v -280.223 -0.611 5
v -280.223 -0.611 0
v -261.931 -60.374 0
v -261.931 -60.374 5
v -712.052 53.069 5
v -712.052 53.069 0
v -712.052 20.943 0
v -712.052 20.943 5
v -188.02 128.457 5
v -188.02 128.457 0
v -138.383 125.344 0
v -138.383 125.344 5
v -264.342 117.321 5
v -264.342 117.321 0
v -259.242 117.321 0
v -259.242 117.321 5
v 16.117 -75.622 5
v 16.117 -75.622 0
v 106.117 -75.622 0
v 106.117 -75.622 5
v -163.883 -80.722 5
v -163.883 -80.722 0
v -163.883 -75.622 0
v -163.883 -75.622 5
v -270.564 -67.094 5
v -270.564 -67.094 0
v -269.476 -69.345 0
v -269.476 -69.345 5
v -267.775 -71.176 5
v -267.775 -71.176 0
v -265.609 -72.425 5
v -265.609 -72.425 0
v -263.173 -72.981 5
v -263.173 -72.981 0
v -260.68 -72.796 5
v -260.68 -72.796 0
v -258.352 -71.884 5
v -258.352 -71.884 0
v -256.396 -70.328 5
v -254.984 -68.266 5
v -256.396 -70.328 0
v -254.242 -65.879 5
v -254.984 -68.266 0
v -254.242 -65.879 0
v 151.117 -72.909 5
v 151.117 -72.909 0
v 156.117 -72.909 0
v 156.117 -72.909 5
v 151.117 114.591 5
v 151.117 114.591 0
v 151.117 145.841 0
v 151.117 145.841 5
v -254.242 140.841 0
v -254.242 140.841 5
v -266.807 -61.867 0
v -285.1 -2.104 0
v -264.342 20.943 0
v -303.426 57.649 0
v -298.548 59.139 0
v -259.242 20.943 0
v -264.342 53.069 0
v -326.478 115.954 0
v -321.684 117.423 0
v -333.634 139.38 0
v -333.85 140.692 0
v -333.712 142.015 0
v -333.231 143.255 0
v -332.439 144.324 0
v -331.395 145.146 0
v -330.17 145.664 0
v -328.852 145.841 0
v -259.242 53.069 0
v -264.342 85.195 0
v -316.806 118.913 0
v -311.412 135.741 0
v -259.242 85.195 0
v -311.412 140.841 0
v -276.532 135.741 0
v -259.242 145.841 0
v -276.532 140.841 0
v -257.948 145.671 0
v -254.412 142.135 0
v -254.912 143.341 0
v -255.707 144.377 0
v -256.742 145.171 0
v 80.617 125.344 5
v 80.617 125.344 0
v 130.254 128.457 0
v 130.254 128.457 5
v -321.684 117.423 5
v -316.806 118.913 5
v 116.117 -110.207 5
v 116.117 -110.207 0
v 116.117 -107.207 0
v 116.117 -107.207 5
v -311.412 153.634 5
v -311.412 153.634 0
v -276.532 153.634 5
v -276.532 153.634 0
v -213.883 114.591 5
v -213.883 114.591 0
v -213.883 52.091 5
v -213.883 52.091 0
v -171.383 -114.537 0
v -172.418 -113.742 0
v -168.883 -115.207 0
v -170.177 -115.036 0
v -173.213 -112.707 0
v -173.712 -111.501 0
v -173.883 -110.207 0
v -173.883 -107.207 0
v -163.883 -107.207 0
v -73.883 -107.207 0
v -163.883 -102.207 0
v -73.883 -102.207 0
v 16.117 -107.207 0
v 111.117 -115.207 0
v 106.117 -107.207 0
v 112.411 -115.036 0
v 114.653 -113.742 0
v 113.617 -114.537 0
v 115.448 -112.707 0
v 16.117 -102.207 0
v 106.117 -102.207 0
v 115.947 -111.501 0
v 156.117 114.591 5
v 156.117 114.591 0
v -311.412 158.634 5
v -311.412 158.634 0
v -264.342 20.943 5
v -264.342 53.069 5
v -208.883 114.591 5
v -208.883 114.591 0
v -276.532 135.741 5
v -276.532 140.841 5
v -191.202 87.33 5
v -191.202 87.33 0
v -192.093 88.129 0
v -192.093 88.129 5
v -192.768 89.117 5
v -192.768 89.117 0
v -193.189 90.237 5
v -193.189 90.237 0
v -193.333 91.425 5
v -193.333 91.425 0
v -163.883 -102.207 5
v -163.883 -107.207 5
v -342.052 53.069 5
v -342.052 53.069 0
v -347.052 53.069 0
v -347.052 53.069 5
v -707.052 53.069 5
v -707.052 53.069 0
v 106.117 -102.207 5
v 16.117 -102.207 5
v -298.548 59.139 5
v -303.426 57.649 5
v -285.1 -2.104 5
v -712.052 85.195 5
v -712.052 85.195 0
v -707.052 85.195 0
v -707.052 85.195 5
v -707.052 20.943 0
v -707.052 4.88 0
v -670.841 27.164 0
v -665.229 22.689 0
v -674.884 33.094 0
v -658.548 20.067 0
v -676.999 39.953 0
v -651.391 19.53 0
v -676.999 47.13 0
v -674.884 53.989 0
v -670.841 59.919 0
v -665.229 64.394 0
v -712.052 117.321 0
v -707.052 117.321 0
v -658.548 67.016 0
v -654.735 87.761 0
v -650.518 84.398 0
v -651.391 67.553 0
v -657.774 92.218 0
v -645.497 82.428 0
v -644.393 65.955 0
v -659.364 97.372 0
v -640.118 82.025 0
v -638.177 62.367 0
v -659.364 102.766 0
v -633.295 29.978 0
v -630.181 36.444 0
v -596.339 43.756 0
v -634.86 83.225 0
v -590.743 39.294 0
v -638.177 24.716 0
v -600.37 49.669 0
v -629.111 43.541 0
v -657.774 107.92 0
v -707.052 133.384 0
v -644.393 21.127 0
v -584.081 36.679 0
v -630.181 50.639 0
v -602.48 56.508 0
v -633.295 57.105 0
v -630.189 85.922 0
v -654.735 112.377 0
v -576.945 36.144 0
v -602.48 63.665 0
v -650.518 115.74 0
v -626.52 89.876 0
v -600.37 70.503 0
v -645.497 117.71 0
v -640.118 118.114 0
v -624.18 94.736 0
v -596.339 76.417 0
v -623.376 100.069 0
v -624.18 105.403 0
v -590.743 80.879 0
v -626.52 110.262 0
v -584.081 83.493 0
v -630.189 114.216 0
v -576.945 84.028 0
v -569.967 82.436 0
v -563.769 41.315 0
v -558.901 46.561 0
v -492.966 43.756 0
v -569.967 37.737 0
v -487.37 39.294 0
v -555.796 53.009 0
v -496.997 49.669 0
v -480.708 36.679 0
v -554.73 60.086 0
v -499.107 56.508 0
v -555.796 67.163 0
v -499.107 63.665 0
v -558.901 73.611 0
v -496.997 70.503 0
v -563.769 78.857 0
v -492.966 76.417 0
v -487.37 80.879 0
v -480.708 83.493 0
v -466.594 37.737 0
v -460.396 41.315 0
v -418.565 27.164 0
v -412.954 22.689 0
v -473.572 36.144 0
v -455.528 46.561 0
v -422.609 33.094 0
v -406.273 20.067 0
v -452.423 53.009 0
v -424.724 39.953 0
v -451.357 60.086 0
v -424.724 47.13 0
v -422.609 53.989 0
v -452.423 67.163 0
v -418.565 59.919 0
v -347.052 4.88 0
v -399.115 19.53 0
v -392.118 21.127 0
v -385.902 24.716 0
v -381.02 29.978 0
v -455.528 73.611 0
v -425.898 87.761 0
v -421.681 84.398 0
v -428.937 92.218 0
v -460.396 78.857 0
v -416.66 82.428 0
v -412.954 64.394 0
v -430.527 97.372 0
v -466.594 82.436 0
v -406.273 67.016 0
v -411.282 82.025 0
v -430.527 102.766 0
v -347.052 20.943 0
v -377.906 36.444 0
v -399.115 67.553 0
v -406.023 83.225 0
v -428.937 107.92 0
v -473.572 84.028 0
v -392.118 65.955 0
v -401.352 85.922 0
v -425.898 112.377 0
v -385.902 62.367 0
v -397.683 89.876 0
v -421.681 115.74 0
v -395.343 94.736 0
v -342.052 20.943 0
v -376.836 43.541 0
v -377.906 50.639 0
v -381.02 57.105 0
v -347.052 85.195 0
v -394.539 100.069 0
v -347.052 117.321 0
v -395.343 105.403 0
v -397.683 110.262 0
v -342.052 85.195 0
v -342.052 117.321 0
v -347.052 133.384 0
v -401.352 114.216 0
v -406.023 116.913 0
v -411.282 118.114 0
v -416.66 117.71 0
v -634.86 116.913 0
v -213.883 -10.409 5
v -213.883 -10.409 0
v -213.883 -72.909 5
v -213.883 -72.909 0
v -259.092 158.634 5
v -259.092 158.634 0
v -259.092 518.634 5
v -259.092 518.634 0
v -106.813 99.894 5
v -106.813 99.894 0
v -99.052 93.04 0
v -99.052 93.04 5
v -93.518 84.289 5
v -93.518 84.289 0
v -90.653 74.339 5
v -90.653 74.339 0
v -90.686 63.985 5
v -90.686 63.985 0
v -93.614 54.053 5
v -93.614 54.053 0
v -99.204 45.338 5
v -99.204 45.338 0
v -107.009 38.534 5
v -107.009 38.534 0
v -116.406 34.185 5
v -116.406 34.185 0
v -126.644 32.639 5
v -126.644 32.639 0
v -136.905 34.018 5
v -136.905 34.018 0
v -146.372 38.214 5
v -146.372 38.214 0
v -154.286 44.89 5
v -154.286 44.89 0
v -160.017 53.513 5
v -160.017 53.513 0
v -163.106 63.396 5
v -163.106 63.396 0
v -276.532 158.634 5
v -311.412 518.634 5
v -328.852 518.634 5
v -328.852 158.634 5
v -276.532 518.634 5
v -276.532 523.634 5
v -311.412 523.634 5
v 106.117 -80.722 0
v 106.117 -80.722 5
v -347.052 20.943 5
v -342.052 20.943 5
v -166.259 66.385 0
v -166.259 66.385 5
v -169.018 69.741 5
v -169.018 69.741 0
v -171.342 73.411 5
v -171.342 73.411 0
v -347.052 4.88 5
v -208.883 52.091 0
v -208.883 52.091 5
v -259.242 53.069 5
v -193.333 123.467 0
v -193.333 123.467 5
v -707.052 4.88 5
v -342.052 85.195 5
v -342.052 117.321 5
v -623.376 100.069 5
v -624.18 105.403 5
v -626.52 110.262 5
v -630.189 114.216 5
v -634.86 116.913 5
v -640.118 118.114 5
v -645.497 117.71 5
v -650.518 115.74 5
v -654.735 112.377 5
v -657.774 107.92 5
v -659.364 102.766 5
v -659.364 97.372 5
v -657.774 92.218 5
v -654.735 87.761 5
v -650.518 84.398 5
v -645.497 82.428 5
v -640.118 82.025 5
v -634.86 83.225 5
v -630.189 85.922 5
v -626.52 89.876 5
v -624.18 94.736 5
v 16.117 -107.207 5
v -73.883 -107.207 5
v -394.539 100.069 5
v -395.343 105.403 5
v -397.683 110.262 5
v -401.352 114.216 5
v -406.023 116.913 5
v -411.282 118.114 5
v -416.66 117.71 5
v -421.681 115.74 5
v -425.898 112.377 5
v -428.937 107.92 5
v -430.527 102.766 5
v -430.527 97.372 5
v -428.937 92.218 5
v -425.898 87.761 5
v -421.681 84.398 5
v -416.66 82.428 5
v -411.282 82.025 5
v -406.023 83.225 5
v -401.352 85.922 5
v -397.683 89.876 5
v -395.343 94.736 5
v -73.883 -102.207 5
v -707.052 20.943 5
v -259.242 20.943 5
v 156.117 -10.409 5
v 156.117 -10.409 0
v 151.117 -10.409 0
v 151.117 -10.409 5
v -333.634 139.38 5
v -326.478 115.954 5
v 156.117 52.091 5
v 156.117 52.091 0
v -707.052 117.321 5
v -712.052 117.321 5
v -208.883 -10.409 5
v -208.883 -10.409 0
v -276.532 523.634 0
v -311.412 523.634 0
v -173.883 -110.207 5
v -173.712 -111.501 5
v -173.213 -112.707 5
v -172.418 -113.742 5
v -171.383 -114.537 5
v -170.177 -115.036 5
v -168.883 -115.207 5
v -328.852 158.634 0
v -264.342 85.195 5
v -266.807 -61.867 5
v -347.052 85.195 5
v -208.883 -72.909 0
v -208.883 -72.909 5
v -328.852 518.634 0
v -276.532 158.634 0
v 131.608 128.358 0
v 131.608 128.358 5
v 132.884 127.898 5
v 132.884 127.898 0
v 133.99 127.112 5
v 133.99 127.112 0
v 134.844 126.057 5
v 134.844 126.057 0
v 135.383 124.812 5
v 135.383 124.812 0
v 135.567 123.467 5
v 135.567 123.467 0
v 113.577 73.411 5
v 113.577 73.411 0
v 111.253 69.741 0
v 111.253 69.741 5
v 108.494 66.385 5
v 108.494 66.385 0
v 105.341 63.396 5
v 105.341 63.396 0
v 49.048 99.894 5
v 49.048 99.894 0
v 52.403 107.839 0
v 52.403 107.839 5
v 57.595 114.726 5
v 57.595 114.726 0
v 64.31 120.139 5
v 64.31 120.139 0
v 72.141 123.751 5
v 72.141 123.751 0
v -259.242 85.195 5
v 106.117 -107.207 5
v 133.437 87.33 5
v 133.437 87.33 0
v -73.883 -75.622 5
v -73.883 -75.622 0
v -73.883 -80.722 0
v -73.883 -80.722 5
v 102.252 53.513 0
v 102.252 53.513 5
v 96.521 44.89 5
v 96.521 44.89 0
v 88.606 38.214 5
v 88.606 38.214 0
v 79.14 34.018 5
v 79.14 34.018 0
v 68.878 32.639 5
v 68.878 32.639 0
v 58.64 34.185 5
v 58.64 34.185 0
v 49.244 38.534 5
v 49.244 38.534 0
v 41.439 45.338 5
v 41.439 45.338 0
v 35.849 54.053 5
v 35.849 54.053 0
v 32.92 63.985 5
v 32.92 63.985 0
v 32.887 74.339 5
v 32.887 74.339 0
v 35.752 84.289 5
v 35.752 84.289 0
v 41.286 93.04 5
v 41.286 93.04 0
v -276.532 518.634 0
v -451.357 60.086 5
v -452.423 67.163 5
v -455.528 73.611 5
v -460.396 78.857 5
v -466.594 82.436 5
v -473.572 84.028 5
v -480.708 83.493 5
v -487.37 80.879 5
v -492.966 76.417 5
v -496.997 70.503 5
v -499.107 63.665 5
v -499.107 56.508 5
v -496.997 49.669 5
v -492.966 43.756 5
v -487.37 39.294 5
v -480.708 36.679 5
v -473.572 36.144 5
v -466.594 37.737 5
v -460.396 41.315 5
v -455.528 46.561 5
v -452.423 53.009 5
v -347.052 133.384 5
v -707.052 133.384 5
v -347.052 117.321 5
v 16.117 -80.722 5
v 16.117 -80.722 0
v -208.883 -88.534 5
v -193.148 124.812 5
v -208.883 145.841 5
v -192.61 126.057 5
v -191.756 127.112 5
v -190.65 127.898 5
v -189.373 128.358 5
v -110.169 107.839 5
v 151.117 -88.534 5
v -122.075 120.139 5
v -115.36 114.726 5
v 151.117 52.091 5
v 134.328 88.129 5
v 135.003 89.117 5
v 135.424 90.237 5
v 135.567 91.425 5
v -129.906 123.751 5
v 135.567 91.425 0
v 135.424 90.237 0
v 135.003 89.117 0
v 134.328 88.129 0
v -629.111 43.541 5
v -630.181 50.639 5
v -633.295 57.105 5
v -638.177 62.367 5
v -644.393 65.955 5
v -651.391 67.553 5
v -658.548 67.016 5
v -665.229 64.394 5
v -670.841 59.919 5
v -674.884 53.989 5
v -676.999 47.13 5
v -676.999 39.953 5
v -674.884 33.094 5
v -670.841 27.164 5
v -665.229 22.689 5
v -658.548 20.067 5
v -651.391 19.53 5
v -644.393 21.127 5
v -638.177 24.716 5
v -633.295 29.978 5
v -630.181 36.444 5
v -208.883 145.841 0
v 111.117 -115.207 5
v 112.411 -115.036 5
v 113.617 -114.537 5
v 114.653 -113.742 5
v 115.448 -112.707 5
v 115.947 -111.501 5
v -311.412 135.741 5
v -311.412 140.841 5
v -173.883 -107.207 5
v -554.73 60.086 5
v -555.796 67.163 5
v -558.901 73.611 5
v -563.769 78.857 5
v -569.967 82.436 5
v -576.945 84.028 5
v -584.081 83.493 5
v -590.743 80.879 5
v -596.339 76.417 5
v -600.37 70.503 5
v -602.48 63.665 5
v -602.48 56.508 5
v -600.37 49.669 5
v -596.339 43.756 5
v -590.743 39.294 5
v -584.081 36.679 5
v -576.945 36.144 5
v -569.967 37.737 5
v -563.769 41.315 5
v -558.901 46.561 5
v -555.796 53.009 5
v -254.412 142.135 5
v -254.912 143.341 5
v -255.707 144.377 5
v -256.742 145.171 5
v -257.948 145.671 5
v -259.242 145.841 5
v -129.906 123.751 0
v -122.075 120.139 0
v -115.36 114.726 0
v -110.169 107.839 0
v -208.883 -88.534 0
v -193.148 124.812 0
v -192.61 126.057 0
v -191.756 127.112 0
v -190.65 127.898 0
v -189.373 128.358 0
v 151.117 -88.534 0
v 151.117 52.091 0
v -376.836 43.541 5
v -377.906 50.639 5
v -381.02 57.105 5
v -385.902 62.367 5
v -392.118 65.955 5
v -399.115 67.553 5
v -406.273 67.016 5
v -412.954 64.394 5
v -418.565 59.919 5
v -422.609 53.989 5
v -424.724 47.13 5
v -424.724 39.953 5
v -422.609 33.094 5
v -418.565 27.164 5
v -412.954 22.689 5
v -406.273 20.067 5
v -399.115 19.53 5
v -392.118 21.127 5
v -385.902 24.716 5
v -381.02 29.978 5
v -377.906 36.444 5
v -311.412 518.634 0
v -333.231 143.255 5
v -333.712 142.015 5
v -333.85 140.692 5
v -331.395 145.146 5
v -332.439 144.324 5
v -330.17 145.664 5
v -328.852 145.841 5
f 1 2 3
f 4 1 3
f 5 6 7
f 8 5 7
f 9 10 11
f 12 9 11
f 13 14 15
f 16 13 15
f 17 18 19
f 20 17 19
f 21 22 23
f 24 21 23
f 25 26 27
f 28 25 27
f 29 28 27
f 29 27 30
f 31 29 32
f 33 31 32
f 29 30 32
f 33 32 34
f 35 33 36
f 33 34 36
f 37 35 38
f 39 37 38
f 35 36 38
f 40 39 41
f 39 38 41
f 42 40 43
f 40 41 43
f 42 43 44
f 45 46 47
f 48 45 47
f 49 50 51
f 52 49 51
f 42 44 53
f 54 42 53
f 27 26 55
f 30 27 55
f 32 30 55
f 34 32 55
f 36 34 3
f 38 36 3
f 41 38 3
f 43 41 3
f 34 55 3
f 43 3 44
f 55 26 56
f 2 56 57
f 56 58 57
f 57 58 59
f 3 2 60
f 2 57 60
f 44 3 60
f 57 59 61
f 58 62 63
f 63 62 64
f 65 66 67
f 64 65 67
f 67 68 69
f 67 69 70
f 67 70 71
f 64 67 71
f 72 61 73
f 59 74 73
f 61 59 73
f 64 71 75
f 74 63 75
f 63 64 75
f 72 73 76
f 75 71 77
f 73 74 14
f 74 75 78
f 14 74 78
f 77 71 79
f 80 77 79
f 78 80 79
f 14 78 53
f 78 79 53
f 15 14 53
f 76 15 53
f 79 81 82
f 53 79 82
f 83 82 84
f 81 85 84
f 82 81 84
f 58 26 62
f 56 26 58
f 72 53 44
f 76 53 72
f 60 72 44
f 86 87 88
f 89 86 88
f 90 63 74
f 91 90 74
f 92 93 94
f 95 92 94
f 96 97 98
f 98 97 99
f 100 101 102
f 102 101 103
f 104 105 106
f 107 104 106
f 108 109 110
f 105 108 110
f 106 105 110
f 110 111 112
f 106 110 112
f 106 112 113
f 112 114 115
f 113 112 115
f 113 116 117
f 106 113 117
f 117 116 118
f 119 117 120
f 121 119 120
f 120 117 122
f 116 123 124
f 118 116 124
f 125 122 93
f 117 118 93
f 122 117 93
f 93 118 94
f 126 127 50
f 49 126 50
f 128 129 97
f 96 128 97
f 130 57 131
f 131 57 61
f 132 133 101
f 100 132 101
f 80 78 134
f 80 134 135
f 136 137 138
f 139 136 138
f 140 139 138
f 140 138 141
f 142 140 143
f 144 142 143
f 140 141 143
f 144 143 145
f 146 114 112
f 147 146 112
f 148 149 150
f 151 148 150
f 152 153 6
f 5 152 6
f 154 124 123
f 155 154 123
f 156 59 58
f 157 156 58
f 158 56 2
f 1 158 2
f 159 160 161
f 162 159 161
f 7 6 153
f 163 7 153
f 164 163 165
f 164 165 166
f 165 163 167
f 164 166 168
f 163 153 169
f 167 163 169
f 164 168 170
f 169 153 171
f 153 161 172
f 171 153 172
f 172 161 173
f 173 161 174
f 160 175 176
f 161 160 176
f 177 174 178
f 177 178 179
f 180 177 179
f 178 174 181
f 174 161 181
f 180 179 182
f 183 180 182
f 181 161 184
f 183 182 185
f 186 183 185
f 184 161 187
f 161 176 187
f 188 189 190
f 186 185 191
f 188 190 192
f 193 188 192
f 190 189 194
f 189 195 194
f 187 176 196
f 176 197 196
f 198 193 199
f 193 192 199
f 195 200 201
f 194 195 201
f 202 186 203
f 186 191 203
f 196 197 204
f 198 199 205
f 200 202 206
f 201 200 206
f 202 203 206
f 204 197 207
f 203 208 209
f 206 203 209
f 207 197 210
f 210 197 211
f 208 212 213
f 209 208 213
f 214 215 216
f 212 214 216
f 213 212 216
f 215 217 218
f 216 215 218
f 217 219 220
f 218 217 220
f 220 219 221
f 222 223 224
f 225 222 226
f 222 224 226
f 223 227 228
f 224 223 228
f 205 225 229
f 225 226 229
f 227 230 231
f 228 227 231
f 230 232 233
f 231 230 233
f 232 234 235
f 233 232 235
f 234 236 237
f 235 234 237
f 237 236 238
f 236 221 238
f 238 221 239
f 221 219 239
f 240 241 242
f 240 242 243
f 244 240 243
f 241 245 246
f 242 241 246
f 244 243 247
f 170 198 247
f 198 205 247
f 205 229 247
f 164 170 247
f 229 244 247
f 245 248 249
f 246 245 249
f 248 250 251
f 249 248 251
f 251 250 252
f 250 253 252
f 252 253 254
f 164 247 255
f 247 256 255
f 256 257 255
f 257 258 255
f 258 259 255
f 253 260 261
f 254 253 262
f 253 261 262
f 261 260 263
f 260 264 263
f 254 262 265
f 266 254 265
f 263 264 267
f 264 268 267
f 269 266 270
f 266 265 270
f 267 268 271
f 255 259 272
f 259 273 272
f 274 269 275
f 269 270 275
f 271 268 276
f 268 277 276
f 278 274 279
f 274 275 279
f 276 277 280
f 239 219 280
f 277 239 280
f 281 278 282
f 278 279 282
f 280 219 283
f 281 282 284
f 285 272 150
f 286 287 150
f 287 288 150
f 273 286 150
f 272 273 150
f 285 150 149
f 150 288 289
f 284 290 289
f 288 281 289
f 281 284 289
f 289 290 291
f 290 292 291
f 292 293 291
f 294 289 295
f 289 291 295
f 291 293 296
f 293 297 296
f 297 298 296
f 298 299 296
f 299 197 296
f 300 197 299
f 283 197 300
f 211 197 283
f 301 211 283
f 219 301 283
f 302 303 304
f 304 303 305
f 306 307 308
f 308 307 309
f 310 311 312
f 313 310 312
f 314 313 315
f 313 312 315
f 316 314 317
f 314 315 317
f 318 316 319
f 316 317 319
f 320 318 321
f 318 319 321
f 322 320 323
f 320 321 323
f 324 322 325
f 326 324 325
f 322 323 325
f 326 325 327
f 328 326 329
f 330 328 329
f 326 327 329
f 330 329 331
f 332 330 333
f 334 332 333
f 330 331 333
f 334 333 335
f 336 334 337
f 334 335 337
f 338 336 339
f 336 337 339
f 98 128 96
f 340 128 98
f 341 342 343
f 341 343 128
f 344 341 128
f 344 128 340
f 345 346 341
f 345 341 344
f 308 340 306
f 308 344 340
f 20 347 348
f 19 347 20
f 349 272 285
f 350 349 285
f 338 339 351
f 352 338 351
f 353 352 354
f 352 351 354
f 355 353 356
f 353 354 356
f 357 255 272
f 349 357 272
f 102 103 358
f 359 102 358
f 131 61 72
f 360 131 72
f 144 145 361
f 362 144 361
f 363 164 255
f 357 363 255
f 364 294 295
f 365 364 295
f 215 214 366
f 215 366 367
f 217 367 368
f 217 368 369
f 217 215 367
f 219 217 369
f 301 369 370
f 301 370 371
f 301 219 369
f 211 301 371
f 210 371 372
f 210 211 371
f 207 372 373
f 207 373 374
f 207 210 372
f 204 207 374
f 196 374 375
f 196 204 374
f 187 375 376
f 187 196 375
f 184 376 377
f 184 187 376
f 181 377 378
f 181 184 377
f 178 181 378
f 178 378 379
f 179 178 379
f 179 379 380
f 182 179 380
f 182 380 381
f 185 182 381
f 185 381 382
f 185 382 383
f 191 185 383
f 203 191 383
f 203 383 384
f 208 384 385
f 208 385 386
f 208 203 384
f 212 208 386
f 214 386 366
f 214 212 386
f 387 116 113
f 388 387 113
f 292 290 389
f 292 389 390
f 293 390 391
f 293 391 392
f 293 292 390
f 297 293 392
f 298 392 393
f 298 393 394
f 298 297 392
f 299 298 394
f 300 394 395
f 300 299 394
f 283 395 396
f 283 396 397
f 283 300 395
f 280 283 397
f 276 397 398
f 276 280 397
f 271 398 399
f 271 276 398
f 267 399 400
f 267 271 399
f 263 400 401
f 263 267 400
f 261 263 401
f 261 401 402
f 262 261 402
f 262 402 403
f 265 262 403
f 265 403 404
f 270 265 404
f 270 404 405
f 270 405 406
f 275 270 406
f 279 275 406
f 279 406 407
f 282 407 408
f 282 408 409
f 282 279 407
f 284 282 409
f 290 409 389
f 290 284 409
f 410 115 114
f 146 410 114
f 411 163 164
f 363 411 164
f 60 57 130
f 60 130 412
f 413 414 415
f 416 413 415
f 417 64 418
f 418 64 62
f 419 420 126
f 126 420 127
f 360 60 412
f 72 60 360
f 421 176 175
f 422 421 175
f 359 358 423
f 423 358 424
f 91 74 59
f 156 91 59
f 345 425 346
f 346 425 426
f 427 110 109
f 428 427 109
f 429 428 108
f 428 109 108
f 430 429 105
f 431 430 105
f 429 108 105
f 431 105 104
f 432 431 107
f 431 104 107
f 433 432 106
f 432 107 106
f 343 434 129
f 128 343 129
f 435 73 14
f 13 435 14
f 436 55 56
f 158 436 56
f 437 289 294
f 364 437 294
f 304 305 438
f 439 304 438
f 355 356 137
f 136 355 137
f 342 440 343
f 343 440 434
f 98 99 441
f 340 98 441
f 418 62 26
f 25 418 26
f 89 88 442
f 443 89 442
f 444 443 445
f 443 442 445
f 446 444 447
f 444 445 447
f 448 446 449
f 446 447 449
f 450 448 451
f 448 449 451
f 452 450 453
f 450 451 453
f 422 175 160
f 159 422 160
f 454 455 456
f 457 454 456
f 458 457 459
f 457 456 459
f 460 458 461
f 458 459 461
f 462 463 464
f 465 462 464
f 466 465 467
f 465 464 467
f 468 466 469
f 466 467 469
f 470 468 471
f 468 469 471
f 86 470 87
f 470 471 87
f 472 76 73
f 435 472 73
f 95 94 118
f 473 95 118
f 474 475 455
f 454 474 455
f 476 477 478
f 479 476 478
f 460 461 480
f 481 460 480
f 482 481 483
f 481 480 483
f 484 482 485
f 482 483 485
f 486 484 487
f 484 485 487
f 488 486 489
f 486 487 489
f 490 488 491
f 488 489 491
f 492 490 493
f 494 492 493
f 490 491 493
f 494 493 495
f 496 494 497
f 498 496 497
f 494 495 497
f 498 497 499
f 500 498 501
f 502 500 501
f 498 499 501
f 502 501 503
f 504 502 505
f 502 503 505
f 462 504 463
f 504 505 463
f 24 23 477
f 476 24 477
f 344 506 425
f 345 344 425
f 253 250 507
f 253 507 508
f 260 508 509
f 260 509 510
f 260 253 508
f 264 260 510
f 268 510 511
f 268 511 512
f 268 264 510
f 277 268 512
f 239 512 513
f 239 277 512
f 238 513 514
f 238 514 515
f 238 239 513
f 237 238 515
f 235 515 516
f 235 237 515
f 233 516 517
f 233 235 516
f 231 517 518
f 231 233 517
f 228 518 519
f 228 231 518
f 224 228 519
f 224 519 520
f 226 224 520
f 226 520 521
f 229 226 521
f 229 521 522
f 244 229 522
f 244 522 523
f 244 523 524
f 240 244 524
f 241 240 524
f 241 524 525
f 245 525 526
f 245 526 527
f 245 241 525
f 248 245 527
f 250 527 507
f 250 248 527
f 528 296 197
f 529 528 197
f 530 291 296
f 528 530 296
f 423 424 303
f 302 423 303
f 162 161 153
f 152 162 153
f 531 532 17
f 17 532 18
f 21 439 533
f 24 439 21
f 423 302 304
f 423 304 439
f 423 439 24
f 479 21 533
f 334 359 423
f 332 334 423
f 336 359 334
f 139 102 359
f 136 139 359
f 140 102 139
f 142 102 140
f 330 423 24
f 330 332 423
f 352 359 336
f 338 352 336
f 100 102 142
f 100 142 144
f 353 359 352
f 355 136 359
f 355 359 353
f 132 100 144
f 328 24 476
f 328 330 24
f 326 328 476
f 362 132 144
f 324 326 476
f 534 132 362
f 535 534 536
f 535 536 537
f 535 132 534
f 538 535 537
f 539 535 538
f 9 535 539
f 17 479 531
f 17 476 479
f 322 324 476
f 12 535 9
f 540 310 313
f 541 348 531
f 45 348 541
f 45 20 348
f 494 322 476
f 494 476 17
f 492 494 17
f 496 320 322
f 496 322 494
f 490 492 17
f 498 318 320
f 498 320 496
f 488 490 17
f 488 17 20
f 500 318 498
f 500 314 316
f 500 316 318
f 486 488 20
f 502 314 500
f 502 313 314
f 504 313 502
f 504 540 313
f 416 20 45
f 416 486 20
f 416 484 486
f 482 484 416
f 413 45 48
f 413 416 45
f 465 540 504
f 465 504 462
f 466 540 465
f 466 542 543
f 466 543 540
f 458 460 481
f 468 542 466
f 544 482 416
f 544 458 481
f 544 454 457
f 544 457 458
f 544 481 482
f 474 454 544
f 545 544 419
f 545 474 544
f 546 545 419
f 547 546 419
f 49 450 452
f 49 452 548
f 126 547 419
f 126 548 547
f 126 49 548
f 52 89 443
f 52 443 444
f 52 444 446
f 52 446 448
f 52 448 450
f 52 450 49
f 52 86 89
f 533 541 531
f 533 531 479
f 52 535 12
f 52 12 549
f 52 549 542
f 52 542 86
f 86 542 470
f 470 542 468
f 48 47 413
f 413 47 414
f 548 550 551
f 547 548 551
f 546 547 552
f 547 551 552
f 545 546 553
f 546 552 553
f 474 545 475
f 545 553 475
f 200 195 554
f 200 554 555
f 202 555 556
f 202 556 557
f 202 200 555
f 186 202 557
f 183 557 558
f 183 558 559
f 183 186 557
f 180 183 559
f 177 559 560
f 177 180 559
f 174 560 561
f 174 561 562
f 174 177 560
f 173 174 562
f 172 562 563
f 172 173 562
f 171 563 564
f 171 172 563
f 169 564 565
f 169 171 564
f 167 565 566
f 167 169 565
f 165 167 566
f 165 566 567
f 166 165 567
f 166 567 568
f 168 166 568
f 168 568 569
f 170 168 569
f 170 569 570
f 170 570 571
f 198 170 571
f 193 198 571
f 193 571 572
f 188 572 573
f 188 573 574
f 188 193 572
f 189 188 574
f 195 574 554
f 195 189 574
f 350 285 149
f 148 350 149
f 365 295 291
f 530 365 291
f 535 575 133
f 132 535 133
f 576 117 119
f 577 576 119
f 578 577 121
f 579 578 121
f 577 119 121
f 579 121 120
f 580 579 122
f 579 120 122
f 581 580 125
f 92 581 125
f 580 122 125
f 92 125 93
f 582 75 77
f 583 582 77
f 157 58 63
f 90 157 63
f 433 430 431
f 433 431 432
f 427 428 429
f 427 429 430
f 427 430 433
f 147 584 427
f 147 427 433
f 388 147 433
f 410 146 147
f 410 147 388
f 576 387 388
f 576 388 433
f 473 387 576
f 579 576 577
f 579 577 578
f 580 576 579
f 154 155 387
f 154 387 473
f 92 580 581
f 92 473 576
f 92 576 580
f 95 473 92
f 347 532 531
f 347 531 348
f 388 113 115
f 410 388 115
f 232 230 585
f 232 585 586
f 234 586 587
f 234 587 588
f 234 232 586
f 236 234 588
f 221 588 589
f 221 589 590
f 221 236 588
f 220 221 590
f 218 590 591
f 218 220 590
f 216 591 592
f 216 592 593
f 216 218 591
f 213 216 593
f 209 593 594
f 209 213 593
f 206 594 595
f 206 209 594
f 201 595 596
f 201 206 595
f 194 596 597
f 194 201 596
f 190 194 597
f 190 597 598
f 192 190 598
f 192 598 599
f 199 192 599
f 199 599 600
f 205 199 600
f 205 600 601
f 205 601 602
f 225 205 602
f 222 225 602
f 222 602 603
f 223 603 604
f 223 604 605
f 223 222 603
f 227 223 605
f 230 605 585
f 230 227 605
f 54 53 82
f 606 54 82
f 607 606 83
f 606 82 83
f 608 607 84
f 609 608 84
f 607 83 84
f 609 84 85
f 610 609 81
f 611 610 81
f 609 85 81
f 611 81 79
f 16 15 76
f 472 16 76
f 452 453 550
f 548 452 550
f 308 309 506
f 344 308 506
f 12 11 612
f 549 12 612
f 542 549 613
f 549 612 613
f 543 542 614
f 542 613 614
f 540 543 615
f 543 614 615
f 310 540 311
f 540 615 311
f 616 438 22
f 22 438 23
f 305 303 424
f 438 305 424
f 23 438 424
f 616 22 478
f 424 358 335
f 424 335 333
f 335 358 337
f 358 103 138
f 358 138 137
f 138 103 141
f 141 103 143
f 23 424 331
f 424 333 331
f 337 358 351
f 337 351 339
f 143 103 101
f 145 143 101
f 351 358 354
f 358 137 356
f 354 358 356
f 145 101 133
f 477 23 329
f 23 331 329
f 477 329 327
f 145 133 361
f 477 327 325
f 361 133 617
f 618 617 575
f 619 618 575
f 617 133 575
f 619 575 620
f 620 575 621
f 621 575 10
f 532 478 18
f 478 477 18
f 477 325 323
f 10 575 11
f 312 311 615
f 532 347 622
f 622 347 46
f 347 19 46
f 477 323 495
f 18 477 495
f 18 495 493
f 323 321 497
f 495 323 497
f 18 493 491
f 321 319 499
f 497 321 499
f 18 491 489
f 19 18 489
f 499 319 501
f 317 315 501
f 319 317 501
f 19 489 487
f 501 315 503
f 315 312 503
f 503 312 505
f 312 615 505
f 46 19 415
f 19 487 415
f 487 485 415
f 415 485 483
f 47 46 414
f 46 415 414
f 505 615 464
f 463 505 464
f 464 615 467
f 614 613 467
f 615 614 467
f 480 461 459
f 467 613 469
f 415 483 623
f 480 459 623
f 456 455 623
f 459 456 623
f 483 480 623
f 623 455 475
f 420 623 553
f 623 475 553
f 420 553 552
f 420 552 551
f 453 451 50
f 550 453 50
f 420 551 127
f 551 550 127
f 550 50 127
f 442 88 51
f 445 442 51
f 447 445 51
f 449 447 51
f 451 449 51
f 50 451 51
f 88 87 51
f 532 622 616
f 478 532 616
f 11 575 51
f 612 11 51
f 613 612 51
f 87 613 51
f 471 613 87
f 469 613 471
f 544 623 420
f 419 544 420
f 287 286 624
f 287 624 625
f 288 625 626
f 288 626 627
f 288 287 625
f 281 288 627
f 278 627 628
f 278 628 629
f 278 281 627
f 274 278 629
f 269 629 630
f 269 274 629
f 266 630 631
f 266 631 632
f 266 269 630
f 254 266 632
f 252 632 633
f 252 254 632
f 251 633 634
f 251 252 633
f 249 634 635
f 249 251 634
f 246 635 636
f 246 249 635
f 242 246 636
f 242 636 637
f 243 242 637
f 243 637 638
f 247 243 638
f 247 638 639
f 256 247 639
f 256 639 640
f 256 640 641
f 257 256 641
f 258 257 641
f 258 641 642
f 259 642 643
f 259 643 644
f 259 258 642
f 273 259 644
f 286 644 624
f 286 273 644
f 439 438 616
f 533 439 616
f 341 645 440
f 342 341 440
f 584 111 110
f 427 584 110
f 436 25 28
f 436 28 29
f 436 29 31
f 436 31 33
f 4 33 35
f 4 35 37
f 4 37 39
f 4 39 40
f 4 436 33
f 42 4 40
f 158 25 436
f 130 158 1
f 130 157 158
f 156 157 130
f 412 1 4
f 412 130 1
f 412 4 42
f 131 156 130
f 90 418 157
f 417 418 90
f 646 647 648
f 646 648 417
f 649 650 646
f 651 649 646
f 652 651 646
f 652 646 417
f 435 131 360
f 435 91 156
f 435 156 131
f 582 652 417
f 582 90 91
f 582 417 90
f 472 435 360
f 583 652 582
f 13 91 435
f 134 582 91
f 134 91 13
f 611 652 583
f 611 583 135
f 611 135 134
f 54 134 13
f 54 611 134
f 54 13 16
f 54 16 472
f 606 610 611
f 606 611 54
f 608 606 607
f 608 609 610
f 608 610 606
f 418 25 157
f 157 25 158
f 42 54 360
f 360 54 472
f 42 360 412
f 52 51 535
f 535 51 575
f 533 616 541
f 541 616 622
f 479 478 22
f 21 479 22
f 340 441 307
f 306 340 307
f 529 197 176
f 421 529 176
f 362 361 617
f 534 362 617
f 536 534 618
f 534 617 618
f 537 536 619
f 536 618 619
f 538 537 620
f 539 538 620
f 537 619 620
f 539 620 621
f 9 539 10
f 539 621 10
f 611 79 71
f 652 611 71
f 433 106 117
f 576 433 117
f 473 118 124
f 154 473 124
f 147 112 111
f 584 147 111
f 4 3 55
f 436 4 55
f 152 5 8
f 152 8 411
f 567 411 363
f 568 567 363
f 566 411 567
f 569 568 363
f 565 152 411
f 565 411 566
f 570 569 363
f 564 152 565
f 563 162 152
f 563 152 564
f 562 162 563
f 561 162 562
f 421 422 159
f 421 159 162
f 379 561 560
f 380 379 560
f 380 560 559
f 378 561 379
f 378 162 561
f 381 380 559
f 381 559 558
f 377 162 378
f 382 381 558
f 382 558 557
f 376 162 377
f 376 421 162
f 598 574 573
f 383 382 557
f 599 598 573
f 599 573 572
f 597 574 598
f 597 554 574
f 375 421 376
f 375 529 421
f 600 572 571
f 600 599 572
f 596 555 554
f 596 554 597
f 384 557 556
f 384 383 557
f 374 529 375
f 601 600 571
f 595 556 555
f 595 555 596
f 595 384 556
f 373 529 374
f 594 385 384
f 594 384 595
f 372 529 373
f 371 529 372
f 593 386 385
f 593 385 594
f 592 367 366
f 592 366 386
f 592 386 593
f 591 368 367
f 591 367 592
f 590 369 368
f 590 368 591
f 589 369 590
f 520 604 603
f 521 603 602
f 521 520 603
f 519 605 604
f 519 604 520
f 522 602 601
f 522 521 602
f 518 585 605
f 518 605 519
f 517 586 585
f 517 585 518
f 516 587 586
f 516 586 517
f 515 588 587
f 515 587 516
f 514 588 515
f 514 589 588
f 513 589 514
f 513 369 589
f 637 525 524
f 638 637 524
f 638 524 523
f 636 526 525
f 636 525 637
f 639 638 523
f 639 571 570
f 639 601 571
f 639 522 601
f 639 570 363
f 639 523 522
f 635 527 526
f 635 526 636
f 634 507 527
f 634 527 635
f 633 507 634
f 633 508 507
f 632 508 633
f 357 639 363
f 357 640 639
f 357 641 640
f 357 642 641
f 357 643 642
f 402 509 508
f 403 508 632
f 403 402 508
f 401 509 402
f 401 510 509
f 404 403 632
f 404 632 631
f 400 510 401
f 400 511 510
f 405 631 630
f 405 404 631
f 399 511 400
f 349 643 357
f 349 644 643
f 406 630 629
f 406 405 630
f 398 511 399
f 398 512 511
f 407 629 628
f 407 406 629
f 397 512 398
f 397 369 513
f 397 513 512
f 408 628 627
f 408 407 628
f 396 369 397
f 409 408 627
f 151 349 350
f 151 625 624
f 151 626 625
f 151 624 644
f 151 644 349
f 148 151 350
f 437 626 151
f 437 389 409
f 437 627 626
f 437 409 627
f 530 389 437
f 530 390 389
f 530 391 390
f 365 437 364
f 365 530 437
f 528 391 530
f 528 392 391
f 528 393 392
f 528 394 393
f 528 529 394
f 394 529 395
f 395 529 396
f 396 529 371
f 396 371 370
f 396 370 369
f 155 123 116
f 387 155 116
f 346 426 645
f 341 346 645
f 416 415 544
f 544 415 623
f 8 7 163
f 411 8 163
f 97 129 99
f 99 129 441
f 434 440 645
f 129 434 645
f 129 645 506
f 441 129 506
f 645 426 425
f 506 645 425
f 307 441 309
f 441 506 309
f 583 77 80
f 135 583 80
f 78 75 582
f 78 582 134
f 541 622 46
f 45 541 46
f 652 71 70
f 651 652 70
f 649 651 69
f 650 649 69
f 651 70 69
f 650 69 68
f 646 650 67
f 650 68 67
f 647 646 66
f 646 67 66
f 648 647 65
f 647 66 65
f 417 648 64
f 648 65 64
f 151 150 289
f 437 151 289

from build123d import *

# Parameters (mm, degrees)
F0_R     = 24.078416685
F0_R_2   = 18.0949458992
F0_R_3   = 24.0092305205
F1_DEPTH = 5
F0_W     = 90
F0_H     = 5.1
F0_W_2   = 34.879950267
F0_W_3   = 5.1
F0_H_2   = 32.1260135388


with BuildPart() as f1:
    # F0 (on Top) → F1 (new body)
    with BuildSketch(Plane.XY):
        Polygon((-347.0522761345, 117.3213401926), (-347.0522761345, 133.384346962), (-527.0522761345, 133.384346962), (-707.0522761345, 133.384346962), (-707.0522761345, 117.3213401926), (-712.0522761345, 117.3213401926), (-712.0522761345, 85.1953266538), (-707.0522761345, 85.1953266538), (-707.0522761345, 53.069313115), (-712.0522761345, 53.069313115), (-712.0522761345, 20.9432995762), (-707.0522761345, 20.9432995762), (-707.0522761345, 4.8802928068), (-347.0522761345, 4.8802928068), (-347.0522761345, 20.9432995762), (-342.0522761345, 20.9432995762), (-342.0522761345, 53.069313115), (-347.0522761345, 53.069313115), (-347.0522761345, 85.1953266538), (-342.0522761345, 85.1953266538), (-342.0522761345, 117.3213401926), align=None)
        with Locations((-653.1898975372, 43.5414463282)):
            Circle(F0_R, mode=Mode.SUBTRACT)
        with Locations((-641.4707303047, 100.069180131)):
            Circle(F0_R_2, mode=Mode.SUBTRACT)
        with Locations((-578.7387490273, 60.086145997)):
            Circle(F0_R_3, mode=Mode.SUBTRACT)
        with Locations((-400.9146547318, 43.5414463282)):
            Circle(F0_R, mode=Mode.SUBTRACT)
        with Locations((-475.3658032417, 60.086145997)):
            Circle(F0_R_3, mode=Mode.SUBTRACT)
        with Locations((-412.6338219643, 100.069180131)):
            Circle(F0_R_2, mode=Mode.SUBTRACT)
    extrude(amount=F1_DEPTH)


with BuildPart() as f1b:
    # F0 (on Top) → F1, piece 2 (new body)
    with BuildSketch(Plane.XY):
        Polygon((-328.8517546294, 518.6337685585), (-328.8517546294, 158.6337685585), (-311.4117794959, 158.6337685585), (-311.4117794959, 153.6337685585), (-293.9718043624, 153.6337685585), (-276.5318292289, 153.6337685585), (-276.5318292289, 158.6337685585), (-259.0918540955, 158.6337685585), (-259.0918540955, 518.6337685585), (-276.5318292289, 518.6337685585), (-276.5318292289, 523.6337685585), (-293.9718043624, 523.6337685585), (-311.4117794959, 523.6337685585), (-311.4117794959, 518.6337685585), align=None)
    extrude(amount=F1_DEPTH)


with BuildPart() as f1c:
    # F0 (on Top) → F1, piece 3 (new body)
    with BuildSketch(Plane.XY):
        Polygon((-208.8826172801, 114.5909994094), (-213.8826172801, 114.5909994094), (-213.8826172801, 52.0909994094), (-208.8826172801, 52.0909994094), (-208.8826172801, 20.8409994094), (-208.8826172801, -10.4090005906), (-213.8826172801, -10.4090005906), (-213.8826172801, -72.9090005906), (-208.8826172801, -72.9090005906), (-208.8826172801, -80.7215005906), (-208.8826172801, -88.5340005906), (151.1173827199, -88.5340005906), (151.1173827199, -72.9090005906), (156.1173827199, -72.9090005906), (156.1173827199, -10.4090005906), (151.1173827199, -10.4090005906), (151.1173827199, 20.8409994094), (151.1173827199, 52.0909994094), (156.1173827199, 52.0909994094), (156.1173827199, 114.5909994094), (151.1173827199, 114.5909994094), (151.1173827199, 145.8409994094), (-208.8826172801, 145.8409994094), align=None)
        Polygon((-118.8826172801, -80.7215005906), (-163.8826172801, -80.7215005906), (-163.8826172801, -75.6215005906), (-73.8826172801, -75.6215005906), (-73.8826172801, -80.7215005906), align=None, mode=Mode.SUBTRACT)
        with Locations((61.1173827199, -78.1715005906)):
            Rectangle(F0_W, F0_H, mode=Mode.SUBTRACT)
        with BuildLine():
            ThreePointArc((-163.1064418044, 63.395986563), (-167.6908016432, 68.0201306029), (-171.3421346171, 73.4114969184))
            Line((-171.3421346171, 73.4114969184), (-191.2022215393, 87.3300559765))
            ThreePointArc((-191.2022215393, 87.3300559765), (-192.7681640584, 89.1168009498), (-193.3326274157, 91.42461695))
            Line((-193.3326274157, 91.42461695), (-193.3326274157, 123.4673008492))
            ThreePointArc((-193.3326274157, 123.4673008492), (-191.7557127114, 127.1118155025), (-188.0196325923, 128.4574946571))
            Line((-188.0196325923, 128.4574946571), (-138.3826444135, 125.3441646052))
            ThreePointArc((-138.3826444135, 125.3441646052), (-118.5506318626, 117.6391622671), (-106.8129221919, 99.8936852508))
            ThreePointArc((-106.8129221919, 99.8936852508), (-107.0088017165, 38.5338046943), (-163.1064418044, 63.395986563))
        make_face(mode=Mode.SUBTRACT)
        with BuildLine():
            Line((135.5673928555, 123.4673008492), (135.5673928555, 91.42461695))
            ThreePointArc((135.5673928555, 91.42461695), (135.0029294982, 89.1168009498), (133.4369869791, 87.3300559765))
            Line((133.4369869791, 87.3300559765), (113.5769000569, 73.4114969184))
            ThreePointArc((113.5769000569, 73.4114969184), (109.9255670831, 68.0201306029), (105.3412072442, 63.395986563))
            ThreePointArc((105.3412072442, 63.395986563), (49.2435671563, 38.5338046943), (49.0476876317, 99.8936852508))
            ThreePointArc((49.0476876317, 99.8936852508), (60.7853973024, 117.6391622671), (80.6174098533, 125.3441646052))
            Line((80.6174098533, 125.3441646052), (130.2543980321, 128.4574946571))
            ThreePointArc((130.2543980321, 128.4574946571), (133.9904781512, 127.1118155025), (135.5673928555, 123.4673008492))
        make_face(mode=Mode.SUBTRACT)
    extrude(amount=F1_DEPTH)


with BuildPart() as f1d:
    # F0 (on Top) → F1, piece 4 (new body)
    with BuildSketch(Plane.XY):
        with BuildLine():
            Line((-326.4778962759, 115.9542165736), (-270.5638649794, -67.094277193))
            ThreePointArc((-270.5638649794, -67.094277193), (-261.9191921392, -72.9817175644), (-254.2420667969, -65.8786147833))
            Line((-254.2420667969, -65.8786147833), (-254.2420667969, 140.8409994094))
            ThreePointArc((-254.2420667969, 140.8409994094), (-255.7065328909, 144.3765333153), (-259.2420667969, 145.8409994094))
            Line((-259.2420667969, 145.8409994094), (-328.8517546294, 145.8409994094))
            ThreePointArc((-328.8517546294, 145.8409994094), (-332.8706710482, 143.8156104459), (-333.6336398831, 139.3803237369))
            Line((-333.6336398831, 139.3803237369), (-326.4778962759, 115.9542165736))
        make_face()
        Polygon((-303.4255201257, 57.6491810925), (-321.683966032, 117.422746764), (-316.8064430732, 118.91263595), (-298.5479971669, 59.1390702785), align=None, mode=Mode.SUBTRACT)
        with Locations((-293.9718043624, 138.2909994094)):
            Rectangle(F0_W_2, F0_H, mode=Mode.SUBTRACT)
        Polygon((-266.8074888299, -61.8670286172), (-285.0996475577, -2.1037712673), (-280.2229657579, -0.6111311151), (-261.9308070301, -60.3743884651), align=None, mode=Mode.SUBTRACT)
        with Locations((-261.7920667969, 37.0063063456)):
            Rectangle(F0_W_3, F0_H_2, mode=Mode.SUBTRACT)
        Polygon((-264.3420667969, 117.3213401926), (-259.2420667969, 117.3213401926), (-259.2420667969, 85.1953266538), (-264.3420667969, 85.1953266538), (-264.3420667969, 101.2583334232), align=None, mode=Mode.SUBTRACT)
    extrude(amount=F1_DEPTH)


with BuildPart() as f1e:
    # F0 (on Top) → F1, piece 5 (new body)
    with BuildSketch(Plane.XY):
        with BuildLine():
            Line((-73.8826172801, -102.2065058351), (-163.8826172801, -102.2065058351))
            Line((-163.8826172801, -102.2065058351), (-163.8826172801, -107.2065058351))
            Line((-163.8826172801, -107.2065058351), (-173.8826172801, -107.2065058351))
            Line((-173.8826172801, -107.2065058351), (-173.8826172801, -110.2065058351))
            ThreePointArc((-173.8826172801, -110.2065058351), (-172.418151186, -113.742039741), (-168.8826172801, -115.2065058351))
            Line((-168.8826172801, -115.2065058351), (111.1173827199, -115.2065058351))
            ThreePointArc((111.1173827199, -115.2065058351), (114.6529166258, -113.742039741), (116.1173827199, -110.2065058351))
            Line((116.1173827199, -110.2065058351), (116.1173827199, -107.2065058351))
            Line((116.1173827199, -107.2065058351), (106.1173827199, -107.2065058351))
            Line((106.1173827199, -107.2065058351), (106.1173827199, -102.2065058351))
            Line((106.1173827199, -102.2065058351), (16.1173827199, -102.2065058351))
            Line((16.1173827199, -102.2065058351), (16.1173827199, -107.2065058351))
            Line((16.1173827199, -107.2065058351), (-73.8826172801, -107.2065058351))
            Line((-73.8826172801, -107.2065058351), (-73.8826172801, -102.2065058351))
        make_face()
    extrude(amount=F1_DEPTH)


solid = Compound([f1.part, f1b.part, f1c.part, f1d.part, f1e.part])
